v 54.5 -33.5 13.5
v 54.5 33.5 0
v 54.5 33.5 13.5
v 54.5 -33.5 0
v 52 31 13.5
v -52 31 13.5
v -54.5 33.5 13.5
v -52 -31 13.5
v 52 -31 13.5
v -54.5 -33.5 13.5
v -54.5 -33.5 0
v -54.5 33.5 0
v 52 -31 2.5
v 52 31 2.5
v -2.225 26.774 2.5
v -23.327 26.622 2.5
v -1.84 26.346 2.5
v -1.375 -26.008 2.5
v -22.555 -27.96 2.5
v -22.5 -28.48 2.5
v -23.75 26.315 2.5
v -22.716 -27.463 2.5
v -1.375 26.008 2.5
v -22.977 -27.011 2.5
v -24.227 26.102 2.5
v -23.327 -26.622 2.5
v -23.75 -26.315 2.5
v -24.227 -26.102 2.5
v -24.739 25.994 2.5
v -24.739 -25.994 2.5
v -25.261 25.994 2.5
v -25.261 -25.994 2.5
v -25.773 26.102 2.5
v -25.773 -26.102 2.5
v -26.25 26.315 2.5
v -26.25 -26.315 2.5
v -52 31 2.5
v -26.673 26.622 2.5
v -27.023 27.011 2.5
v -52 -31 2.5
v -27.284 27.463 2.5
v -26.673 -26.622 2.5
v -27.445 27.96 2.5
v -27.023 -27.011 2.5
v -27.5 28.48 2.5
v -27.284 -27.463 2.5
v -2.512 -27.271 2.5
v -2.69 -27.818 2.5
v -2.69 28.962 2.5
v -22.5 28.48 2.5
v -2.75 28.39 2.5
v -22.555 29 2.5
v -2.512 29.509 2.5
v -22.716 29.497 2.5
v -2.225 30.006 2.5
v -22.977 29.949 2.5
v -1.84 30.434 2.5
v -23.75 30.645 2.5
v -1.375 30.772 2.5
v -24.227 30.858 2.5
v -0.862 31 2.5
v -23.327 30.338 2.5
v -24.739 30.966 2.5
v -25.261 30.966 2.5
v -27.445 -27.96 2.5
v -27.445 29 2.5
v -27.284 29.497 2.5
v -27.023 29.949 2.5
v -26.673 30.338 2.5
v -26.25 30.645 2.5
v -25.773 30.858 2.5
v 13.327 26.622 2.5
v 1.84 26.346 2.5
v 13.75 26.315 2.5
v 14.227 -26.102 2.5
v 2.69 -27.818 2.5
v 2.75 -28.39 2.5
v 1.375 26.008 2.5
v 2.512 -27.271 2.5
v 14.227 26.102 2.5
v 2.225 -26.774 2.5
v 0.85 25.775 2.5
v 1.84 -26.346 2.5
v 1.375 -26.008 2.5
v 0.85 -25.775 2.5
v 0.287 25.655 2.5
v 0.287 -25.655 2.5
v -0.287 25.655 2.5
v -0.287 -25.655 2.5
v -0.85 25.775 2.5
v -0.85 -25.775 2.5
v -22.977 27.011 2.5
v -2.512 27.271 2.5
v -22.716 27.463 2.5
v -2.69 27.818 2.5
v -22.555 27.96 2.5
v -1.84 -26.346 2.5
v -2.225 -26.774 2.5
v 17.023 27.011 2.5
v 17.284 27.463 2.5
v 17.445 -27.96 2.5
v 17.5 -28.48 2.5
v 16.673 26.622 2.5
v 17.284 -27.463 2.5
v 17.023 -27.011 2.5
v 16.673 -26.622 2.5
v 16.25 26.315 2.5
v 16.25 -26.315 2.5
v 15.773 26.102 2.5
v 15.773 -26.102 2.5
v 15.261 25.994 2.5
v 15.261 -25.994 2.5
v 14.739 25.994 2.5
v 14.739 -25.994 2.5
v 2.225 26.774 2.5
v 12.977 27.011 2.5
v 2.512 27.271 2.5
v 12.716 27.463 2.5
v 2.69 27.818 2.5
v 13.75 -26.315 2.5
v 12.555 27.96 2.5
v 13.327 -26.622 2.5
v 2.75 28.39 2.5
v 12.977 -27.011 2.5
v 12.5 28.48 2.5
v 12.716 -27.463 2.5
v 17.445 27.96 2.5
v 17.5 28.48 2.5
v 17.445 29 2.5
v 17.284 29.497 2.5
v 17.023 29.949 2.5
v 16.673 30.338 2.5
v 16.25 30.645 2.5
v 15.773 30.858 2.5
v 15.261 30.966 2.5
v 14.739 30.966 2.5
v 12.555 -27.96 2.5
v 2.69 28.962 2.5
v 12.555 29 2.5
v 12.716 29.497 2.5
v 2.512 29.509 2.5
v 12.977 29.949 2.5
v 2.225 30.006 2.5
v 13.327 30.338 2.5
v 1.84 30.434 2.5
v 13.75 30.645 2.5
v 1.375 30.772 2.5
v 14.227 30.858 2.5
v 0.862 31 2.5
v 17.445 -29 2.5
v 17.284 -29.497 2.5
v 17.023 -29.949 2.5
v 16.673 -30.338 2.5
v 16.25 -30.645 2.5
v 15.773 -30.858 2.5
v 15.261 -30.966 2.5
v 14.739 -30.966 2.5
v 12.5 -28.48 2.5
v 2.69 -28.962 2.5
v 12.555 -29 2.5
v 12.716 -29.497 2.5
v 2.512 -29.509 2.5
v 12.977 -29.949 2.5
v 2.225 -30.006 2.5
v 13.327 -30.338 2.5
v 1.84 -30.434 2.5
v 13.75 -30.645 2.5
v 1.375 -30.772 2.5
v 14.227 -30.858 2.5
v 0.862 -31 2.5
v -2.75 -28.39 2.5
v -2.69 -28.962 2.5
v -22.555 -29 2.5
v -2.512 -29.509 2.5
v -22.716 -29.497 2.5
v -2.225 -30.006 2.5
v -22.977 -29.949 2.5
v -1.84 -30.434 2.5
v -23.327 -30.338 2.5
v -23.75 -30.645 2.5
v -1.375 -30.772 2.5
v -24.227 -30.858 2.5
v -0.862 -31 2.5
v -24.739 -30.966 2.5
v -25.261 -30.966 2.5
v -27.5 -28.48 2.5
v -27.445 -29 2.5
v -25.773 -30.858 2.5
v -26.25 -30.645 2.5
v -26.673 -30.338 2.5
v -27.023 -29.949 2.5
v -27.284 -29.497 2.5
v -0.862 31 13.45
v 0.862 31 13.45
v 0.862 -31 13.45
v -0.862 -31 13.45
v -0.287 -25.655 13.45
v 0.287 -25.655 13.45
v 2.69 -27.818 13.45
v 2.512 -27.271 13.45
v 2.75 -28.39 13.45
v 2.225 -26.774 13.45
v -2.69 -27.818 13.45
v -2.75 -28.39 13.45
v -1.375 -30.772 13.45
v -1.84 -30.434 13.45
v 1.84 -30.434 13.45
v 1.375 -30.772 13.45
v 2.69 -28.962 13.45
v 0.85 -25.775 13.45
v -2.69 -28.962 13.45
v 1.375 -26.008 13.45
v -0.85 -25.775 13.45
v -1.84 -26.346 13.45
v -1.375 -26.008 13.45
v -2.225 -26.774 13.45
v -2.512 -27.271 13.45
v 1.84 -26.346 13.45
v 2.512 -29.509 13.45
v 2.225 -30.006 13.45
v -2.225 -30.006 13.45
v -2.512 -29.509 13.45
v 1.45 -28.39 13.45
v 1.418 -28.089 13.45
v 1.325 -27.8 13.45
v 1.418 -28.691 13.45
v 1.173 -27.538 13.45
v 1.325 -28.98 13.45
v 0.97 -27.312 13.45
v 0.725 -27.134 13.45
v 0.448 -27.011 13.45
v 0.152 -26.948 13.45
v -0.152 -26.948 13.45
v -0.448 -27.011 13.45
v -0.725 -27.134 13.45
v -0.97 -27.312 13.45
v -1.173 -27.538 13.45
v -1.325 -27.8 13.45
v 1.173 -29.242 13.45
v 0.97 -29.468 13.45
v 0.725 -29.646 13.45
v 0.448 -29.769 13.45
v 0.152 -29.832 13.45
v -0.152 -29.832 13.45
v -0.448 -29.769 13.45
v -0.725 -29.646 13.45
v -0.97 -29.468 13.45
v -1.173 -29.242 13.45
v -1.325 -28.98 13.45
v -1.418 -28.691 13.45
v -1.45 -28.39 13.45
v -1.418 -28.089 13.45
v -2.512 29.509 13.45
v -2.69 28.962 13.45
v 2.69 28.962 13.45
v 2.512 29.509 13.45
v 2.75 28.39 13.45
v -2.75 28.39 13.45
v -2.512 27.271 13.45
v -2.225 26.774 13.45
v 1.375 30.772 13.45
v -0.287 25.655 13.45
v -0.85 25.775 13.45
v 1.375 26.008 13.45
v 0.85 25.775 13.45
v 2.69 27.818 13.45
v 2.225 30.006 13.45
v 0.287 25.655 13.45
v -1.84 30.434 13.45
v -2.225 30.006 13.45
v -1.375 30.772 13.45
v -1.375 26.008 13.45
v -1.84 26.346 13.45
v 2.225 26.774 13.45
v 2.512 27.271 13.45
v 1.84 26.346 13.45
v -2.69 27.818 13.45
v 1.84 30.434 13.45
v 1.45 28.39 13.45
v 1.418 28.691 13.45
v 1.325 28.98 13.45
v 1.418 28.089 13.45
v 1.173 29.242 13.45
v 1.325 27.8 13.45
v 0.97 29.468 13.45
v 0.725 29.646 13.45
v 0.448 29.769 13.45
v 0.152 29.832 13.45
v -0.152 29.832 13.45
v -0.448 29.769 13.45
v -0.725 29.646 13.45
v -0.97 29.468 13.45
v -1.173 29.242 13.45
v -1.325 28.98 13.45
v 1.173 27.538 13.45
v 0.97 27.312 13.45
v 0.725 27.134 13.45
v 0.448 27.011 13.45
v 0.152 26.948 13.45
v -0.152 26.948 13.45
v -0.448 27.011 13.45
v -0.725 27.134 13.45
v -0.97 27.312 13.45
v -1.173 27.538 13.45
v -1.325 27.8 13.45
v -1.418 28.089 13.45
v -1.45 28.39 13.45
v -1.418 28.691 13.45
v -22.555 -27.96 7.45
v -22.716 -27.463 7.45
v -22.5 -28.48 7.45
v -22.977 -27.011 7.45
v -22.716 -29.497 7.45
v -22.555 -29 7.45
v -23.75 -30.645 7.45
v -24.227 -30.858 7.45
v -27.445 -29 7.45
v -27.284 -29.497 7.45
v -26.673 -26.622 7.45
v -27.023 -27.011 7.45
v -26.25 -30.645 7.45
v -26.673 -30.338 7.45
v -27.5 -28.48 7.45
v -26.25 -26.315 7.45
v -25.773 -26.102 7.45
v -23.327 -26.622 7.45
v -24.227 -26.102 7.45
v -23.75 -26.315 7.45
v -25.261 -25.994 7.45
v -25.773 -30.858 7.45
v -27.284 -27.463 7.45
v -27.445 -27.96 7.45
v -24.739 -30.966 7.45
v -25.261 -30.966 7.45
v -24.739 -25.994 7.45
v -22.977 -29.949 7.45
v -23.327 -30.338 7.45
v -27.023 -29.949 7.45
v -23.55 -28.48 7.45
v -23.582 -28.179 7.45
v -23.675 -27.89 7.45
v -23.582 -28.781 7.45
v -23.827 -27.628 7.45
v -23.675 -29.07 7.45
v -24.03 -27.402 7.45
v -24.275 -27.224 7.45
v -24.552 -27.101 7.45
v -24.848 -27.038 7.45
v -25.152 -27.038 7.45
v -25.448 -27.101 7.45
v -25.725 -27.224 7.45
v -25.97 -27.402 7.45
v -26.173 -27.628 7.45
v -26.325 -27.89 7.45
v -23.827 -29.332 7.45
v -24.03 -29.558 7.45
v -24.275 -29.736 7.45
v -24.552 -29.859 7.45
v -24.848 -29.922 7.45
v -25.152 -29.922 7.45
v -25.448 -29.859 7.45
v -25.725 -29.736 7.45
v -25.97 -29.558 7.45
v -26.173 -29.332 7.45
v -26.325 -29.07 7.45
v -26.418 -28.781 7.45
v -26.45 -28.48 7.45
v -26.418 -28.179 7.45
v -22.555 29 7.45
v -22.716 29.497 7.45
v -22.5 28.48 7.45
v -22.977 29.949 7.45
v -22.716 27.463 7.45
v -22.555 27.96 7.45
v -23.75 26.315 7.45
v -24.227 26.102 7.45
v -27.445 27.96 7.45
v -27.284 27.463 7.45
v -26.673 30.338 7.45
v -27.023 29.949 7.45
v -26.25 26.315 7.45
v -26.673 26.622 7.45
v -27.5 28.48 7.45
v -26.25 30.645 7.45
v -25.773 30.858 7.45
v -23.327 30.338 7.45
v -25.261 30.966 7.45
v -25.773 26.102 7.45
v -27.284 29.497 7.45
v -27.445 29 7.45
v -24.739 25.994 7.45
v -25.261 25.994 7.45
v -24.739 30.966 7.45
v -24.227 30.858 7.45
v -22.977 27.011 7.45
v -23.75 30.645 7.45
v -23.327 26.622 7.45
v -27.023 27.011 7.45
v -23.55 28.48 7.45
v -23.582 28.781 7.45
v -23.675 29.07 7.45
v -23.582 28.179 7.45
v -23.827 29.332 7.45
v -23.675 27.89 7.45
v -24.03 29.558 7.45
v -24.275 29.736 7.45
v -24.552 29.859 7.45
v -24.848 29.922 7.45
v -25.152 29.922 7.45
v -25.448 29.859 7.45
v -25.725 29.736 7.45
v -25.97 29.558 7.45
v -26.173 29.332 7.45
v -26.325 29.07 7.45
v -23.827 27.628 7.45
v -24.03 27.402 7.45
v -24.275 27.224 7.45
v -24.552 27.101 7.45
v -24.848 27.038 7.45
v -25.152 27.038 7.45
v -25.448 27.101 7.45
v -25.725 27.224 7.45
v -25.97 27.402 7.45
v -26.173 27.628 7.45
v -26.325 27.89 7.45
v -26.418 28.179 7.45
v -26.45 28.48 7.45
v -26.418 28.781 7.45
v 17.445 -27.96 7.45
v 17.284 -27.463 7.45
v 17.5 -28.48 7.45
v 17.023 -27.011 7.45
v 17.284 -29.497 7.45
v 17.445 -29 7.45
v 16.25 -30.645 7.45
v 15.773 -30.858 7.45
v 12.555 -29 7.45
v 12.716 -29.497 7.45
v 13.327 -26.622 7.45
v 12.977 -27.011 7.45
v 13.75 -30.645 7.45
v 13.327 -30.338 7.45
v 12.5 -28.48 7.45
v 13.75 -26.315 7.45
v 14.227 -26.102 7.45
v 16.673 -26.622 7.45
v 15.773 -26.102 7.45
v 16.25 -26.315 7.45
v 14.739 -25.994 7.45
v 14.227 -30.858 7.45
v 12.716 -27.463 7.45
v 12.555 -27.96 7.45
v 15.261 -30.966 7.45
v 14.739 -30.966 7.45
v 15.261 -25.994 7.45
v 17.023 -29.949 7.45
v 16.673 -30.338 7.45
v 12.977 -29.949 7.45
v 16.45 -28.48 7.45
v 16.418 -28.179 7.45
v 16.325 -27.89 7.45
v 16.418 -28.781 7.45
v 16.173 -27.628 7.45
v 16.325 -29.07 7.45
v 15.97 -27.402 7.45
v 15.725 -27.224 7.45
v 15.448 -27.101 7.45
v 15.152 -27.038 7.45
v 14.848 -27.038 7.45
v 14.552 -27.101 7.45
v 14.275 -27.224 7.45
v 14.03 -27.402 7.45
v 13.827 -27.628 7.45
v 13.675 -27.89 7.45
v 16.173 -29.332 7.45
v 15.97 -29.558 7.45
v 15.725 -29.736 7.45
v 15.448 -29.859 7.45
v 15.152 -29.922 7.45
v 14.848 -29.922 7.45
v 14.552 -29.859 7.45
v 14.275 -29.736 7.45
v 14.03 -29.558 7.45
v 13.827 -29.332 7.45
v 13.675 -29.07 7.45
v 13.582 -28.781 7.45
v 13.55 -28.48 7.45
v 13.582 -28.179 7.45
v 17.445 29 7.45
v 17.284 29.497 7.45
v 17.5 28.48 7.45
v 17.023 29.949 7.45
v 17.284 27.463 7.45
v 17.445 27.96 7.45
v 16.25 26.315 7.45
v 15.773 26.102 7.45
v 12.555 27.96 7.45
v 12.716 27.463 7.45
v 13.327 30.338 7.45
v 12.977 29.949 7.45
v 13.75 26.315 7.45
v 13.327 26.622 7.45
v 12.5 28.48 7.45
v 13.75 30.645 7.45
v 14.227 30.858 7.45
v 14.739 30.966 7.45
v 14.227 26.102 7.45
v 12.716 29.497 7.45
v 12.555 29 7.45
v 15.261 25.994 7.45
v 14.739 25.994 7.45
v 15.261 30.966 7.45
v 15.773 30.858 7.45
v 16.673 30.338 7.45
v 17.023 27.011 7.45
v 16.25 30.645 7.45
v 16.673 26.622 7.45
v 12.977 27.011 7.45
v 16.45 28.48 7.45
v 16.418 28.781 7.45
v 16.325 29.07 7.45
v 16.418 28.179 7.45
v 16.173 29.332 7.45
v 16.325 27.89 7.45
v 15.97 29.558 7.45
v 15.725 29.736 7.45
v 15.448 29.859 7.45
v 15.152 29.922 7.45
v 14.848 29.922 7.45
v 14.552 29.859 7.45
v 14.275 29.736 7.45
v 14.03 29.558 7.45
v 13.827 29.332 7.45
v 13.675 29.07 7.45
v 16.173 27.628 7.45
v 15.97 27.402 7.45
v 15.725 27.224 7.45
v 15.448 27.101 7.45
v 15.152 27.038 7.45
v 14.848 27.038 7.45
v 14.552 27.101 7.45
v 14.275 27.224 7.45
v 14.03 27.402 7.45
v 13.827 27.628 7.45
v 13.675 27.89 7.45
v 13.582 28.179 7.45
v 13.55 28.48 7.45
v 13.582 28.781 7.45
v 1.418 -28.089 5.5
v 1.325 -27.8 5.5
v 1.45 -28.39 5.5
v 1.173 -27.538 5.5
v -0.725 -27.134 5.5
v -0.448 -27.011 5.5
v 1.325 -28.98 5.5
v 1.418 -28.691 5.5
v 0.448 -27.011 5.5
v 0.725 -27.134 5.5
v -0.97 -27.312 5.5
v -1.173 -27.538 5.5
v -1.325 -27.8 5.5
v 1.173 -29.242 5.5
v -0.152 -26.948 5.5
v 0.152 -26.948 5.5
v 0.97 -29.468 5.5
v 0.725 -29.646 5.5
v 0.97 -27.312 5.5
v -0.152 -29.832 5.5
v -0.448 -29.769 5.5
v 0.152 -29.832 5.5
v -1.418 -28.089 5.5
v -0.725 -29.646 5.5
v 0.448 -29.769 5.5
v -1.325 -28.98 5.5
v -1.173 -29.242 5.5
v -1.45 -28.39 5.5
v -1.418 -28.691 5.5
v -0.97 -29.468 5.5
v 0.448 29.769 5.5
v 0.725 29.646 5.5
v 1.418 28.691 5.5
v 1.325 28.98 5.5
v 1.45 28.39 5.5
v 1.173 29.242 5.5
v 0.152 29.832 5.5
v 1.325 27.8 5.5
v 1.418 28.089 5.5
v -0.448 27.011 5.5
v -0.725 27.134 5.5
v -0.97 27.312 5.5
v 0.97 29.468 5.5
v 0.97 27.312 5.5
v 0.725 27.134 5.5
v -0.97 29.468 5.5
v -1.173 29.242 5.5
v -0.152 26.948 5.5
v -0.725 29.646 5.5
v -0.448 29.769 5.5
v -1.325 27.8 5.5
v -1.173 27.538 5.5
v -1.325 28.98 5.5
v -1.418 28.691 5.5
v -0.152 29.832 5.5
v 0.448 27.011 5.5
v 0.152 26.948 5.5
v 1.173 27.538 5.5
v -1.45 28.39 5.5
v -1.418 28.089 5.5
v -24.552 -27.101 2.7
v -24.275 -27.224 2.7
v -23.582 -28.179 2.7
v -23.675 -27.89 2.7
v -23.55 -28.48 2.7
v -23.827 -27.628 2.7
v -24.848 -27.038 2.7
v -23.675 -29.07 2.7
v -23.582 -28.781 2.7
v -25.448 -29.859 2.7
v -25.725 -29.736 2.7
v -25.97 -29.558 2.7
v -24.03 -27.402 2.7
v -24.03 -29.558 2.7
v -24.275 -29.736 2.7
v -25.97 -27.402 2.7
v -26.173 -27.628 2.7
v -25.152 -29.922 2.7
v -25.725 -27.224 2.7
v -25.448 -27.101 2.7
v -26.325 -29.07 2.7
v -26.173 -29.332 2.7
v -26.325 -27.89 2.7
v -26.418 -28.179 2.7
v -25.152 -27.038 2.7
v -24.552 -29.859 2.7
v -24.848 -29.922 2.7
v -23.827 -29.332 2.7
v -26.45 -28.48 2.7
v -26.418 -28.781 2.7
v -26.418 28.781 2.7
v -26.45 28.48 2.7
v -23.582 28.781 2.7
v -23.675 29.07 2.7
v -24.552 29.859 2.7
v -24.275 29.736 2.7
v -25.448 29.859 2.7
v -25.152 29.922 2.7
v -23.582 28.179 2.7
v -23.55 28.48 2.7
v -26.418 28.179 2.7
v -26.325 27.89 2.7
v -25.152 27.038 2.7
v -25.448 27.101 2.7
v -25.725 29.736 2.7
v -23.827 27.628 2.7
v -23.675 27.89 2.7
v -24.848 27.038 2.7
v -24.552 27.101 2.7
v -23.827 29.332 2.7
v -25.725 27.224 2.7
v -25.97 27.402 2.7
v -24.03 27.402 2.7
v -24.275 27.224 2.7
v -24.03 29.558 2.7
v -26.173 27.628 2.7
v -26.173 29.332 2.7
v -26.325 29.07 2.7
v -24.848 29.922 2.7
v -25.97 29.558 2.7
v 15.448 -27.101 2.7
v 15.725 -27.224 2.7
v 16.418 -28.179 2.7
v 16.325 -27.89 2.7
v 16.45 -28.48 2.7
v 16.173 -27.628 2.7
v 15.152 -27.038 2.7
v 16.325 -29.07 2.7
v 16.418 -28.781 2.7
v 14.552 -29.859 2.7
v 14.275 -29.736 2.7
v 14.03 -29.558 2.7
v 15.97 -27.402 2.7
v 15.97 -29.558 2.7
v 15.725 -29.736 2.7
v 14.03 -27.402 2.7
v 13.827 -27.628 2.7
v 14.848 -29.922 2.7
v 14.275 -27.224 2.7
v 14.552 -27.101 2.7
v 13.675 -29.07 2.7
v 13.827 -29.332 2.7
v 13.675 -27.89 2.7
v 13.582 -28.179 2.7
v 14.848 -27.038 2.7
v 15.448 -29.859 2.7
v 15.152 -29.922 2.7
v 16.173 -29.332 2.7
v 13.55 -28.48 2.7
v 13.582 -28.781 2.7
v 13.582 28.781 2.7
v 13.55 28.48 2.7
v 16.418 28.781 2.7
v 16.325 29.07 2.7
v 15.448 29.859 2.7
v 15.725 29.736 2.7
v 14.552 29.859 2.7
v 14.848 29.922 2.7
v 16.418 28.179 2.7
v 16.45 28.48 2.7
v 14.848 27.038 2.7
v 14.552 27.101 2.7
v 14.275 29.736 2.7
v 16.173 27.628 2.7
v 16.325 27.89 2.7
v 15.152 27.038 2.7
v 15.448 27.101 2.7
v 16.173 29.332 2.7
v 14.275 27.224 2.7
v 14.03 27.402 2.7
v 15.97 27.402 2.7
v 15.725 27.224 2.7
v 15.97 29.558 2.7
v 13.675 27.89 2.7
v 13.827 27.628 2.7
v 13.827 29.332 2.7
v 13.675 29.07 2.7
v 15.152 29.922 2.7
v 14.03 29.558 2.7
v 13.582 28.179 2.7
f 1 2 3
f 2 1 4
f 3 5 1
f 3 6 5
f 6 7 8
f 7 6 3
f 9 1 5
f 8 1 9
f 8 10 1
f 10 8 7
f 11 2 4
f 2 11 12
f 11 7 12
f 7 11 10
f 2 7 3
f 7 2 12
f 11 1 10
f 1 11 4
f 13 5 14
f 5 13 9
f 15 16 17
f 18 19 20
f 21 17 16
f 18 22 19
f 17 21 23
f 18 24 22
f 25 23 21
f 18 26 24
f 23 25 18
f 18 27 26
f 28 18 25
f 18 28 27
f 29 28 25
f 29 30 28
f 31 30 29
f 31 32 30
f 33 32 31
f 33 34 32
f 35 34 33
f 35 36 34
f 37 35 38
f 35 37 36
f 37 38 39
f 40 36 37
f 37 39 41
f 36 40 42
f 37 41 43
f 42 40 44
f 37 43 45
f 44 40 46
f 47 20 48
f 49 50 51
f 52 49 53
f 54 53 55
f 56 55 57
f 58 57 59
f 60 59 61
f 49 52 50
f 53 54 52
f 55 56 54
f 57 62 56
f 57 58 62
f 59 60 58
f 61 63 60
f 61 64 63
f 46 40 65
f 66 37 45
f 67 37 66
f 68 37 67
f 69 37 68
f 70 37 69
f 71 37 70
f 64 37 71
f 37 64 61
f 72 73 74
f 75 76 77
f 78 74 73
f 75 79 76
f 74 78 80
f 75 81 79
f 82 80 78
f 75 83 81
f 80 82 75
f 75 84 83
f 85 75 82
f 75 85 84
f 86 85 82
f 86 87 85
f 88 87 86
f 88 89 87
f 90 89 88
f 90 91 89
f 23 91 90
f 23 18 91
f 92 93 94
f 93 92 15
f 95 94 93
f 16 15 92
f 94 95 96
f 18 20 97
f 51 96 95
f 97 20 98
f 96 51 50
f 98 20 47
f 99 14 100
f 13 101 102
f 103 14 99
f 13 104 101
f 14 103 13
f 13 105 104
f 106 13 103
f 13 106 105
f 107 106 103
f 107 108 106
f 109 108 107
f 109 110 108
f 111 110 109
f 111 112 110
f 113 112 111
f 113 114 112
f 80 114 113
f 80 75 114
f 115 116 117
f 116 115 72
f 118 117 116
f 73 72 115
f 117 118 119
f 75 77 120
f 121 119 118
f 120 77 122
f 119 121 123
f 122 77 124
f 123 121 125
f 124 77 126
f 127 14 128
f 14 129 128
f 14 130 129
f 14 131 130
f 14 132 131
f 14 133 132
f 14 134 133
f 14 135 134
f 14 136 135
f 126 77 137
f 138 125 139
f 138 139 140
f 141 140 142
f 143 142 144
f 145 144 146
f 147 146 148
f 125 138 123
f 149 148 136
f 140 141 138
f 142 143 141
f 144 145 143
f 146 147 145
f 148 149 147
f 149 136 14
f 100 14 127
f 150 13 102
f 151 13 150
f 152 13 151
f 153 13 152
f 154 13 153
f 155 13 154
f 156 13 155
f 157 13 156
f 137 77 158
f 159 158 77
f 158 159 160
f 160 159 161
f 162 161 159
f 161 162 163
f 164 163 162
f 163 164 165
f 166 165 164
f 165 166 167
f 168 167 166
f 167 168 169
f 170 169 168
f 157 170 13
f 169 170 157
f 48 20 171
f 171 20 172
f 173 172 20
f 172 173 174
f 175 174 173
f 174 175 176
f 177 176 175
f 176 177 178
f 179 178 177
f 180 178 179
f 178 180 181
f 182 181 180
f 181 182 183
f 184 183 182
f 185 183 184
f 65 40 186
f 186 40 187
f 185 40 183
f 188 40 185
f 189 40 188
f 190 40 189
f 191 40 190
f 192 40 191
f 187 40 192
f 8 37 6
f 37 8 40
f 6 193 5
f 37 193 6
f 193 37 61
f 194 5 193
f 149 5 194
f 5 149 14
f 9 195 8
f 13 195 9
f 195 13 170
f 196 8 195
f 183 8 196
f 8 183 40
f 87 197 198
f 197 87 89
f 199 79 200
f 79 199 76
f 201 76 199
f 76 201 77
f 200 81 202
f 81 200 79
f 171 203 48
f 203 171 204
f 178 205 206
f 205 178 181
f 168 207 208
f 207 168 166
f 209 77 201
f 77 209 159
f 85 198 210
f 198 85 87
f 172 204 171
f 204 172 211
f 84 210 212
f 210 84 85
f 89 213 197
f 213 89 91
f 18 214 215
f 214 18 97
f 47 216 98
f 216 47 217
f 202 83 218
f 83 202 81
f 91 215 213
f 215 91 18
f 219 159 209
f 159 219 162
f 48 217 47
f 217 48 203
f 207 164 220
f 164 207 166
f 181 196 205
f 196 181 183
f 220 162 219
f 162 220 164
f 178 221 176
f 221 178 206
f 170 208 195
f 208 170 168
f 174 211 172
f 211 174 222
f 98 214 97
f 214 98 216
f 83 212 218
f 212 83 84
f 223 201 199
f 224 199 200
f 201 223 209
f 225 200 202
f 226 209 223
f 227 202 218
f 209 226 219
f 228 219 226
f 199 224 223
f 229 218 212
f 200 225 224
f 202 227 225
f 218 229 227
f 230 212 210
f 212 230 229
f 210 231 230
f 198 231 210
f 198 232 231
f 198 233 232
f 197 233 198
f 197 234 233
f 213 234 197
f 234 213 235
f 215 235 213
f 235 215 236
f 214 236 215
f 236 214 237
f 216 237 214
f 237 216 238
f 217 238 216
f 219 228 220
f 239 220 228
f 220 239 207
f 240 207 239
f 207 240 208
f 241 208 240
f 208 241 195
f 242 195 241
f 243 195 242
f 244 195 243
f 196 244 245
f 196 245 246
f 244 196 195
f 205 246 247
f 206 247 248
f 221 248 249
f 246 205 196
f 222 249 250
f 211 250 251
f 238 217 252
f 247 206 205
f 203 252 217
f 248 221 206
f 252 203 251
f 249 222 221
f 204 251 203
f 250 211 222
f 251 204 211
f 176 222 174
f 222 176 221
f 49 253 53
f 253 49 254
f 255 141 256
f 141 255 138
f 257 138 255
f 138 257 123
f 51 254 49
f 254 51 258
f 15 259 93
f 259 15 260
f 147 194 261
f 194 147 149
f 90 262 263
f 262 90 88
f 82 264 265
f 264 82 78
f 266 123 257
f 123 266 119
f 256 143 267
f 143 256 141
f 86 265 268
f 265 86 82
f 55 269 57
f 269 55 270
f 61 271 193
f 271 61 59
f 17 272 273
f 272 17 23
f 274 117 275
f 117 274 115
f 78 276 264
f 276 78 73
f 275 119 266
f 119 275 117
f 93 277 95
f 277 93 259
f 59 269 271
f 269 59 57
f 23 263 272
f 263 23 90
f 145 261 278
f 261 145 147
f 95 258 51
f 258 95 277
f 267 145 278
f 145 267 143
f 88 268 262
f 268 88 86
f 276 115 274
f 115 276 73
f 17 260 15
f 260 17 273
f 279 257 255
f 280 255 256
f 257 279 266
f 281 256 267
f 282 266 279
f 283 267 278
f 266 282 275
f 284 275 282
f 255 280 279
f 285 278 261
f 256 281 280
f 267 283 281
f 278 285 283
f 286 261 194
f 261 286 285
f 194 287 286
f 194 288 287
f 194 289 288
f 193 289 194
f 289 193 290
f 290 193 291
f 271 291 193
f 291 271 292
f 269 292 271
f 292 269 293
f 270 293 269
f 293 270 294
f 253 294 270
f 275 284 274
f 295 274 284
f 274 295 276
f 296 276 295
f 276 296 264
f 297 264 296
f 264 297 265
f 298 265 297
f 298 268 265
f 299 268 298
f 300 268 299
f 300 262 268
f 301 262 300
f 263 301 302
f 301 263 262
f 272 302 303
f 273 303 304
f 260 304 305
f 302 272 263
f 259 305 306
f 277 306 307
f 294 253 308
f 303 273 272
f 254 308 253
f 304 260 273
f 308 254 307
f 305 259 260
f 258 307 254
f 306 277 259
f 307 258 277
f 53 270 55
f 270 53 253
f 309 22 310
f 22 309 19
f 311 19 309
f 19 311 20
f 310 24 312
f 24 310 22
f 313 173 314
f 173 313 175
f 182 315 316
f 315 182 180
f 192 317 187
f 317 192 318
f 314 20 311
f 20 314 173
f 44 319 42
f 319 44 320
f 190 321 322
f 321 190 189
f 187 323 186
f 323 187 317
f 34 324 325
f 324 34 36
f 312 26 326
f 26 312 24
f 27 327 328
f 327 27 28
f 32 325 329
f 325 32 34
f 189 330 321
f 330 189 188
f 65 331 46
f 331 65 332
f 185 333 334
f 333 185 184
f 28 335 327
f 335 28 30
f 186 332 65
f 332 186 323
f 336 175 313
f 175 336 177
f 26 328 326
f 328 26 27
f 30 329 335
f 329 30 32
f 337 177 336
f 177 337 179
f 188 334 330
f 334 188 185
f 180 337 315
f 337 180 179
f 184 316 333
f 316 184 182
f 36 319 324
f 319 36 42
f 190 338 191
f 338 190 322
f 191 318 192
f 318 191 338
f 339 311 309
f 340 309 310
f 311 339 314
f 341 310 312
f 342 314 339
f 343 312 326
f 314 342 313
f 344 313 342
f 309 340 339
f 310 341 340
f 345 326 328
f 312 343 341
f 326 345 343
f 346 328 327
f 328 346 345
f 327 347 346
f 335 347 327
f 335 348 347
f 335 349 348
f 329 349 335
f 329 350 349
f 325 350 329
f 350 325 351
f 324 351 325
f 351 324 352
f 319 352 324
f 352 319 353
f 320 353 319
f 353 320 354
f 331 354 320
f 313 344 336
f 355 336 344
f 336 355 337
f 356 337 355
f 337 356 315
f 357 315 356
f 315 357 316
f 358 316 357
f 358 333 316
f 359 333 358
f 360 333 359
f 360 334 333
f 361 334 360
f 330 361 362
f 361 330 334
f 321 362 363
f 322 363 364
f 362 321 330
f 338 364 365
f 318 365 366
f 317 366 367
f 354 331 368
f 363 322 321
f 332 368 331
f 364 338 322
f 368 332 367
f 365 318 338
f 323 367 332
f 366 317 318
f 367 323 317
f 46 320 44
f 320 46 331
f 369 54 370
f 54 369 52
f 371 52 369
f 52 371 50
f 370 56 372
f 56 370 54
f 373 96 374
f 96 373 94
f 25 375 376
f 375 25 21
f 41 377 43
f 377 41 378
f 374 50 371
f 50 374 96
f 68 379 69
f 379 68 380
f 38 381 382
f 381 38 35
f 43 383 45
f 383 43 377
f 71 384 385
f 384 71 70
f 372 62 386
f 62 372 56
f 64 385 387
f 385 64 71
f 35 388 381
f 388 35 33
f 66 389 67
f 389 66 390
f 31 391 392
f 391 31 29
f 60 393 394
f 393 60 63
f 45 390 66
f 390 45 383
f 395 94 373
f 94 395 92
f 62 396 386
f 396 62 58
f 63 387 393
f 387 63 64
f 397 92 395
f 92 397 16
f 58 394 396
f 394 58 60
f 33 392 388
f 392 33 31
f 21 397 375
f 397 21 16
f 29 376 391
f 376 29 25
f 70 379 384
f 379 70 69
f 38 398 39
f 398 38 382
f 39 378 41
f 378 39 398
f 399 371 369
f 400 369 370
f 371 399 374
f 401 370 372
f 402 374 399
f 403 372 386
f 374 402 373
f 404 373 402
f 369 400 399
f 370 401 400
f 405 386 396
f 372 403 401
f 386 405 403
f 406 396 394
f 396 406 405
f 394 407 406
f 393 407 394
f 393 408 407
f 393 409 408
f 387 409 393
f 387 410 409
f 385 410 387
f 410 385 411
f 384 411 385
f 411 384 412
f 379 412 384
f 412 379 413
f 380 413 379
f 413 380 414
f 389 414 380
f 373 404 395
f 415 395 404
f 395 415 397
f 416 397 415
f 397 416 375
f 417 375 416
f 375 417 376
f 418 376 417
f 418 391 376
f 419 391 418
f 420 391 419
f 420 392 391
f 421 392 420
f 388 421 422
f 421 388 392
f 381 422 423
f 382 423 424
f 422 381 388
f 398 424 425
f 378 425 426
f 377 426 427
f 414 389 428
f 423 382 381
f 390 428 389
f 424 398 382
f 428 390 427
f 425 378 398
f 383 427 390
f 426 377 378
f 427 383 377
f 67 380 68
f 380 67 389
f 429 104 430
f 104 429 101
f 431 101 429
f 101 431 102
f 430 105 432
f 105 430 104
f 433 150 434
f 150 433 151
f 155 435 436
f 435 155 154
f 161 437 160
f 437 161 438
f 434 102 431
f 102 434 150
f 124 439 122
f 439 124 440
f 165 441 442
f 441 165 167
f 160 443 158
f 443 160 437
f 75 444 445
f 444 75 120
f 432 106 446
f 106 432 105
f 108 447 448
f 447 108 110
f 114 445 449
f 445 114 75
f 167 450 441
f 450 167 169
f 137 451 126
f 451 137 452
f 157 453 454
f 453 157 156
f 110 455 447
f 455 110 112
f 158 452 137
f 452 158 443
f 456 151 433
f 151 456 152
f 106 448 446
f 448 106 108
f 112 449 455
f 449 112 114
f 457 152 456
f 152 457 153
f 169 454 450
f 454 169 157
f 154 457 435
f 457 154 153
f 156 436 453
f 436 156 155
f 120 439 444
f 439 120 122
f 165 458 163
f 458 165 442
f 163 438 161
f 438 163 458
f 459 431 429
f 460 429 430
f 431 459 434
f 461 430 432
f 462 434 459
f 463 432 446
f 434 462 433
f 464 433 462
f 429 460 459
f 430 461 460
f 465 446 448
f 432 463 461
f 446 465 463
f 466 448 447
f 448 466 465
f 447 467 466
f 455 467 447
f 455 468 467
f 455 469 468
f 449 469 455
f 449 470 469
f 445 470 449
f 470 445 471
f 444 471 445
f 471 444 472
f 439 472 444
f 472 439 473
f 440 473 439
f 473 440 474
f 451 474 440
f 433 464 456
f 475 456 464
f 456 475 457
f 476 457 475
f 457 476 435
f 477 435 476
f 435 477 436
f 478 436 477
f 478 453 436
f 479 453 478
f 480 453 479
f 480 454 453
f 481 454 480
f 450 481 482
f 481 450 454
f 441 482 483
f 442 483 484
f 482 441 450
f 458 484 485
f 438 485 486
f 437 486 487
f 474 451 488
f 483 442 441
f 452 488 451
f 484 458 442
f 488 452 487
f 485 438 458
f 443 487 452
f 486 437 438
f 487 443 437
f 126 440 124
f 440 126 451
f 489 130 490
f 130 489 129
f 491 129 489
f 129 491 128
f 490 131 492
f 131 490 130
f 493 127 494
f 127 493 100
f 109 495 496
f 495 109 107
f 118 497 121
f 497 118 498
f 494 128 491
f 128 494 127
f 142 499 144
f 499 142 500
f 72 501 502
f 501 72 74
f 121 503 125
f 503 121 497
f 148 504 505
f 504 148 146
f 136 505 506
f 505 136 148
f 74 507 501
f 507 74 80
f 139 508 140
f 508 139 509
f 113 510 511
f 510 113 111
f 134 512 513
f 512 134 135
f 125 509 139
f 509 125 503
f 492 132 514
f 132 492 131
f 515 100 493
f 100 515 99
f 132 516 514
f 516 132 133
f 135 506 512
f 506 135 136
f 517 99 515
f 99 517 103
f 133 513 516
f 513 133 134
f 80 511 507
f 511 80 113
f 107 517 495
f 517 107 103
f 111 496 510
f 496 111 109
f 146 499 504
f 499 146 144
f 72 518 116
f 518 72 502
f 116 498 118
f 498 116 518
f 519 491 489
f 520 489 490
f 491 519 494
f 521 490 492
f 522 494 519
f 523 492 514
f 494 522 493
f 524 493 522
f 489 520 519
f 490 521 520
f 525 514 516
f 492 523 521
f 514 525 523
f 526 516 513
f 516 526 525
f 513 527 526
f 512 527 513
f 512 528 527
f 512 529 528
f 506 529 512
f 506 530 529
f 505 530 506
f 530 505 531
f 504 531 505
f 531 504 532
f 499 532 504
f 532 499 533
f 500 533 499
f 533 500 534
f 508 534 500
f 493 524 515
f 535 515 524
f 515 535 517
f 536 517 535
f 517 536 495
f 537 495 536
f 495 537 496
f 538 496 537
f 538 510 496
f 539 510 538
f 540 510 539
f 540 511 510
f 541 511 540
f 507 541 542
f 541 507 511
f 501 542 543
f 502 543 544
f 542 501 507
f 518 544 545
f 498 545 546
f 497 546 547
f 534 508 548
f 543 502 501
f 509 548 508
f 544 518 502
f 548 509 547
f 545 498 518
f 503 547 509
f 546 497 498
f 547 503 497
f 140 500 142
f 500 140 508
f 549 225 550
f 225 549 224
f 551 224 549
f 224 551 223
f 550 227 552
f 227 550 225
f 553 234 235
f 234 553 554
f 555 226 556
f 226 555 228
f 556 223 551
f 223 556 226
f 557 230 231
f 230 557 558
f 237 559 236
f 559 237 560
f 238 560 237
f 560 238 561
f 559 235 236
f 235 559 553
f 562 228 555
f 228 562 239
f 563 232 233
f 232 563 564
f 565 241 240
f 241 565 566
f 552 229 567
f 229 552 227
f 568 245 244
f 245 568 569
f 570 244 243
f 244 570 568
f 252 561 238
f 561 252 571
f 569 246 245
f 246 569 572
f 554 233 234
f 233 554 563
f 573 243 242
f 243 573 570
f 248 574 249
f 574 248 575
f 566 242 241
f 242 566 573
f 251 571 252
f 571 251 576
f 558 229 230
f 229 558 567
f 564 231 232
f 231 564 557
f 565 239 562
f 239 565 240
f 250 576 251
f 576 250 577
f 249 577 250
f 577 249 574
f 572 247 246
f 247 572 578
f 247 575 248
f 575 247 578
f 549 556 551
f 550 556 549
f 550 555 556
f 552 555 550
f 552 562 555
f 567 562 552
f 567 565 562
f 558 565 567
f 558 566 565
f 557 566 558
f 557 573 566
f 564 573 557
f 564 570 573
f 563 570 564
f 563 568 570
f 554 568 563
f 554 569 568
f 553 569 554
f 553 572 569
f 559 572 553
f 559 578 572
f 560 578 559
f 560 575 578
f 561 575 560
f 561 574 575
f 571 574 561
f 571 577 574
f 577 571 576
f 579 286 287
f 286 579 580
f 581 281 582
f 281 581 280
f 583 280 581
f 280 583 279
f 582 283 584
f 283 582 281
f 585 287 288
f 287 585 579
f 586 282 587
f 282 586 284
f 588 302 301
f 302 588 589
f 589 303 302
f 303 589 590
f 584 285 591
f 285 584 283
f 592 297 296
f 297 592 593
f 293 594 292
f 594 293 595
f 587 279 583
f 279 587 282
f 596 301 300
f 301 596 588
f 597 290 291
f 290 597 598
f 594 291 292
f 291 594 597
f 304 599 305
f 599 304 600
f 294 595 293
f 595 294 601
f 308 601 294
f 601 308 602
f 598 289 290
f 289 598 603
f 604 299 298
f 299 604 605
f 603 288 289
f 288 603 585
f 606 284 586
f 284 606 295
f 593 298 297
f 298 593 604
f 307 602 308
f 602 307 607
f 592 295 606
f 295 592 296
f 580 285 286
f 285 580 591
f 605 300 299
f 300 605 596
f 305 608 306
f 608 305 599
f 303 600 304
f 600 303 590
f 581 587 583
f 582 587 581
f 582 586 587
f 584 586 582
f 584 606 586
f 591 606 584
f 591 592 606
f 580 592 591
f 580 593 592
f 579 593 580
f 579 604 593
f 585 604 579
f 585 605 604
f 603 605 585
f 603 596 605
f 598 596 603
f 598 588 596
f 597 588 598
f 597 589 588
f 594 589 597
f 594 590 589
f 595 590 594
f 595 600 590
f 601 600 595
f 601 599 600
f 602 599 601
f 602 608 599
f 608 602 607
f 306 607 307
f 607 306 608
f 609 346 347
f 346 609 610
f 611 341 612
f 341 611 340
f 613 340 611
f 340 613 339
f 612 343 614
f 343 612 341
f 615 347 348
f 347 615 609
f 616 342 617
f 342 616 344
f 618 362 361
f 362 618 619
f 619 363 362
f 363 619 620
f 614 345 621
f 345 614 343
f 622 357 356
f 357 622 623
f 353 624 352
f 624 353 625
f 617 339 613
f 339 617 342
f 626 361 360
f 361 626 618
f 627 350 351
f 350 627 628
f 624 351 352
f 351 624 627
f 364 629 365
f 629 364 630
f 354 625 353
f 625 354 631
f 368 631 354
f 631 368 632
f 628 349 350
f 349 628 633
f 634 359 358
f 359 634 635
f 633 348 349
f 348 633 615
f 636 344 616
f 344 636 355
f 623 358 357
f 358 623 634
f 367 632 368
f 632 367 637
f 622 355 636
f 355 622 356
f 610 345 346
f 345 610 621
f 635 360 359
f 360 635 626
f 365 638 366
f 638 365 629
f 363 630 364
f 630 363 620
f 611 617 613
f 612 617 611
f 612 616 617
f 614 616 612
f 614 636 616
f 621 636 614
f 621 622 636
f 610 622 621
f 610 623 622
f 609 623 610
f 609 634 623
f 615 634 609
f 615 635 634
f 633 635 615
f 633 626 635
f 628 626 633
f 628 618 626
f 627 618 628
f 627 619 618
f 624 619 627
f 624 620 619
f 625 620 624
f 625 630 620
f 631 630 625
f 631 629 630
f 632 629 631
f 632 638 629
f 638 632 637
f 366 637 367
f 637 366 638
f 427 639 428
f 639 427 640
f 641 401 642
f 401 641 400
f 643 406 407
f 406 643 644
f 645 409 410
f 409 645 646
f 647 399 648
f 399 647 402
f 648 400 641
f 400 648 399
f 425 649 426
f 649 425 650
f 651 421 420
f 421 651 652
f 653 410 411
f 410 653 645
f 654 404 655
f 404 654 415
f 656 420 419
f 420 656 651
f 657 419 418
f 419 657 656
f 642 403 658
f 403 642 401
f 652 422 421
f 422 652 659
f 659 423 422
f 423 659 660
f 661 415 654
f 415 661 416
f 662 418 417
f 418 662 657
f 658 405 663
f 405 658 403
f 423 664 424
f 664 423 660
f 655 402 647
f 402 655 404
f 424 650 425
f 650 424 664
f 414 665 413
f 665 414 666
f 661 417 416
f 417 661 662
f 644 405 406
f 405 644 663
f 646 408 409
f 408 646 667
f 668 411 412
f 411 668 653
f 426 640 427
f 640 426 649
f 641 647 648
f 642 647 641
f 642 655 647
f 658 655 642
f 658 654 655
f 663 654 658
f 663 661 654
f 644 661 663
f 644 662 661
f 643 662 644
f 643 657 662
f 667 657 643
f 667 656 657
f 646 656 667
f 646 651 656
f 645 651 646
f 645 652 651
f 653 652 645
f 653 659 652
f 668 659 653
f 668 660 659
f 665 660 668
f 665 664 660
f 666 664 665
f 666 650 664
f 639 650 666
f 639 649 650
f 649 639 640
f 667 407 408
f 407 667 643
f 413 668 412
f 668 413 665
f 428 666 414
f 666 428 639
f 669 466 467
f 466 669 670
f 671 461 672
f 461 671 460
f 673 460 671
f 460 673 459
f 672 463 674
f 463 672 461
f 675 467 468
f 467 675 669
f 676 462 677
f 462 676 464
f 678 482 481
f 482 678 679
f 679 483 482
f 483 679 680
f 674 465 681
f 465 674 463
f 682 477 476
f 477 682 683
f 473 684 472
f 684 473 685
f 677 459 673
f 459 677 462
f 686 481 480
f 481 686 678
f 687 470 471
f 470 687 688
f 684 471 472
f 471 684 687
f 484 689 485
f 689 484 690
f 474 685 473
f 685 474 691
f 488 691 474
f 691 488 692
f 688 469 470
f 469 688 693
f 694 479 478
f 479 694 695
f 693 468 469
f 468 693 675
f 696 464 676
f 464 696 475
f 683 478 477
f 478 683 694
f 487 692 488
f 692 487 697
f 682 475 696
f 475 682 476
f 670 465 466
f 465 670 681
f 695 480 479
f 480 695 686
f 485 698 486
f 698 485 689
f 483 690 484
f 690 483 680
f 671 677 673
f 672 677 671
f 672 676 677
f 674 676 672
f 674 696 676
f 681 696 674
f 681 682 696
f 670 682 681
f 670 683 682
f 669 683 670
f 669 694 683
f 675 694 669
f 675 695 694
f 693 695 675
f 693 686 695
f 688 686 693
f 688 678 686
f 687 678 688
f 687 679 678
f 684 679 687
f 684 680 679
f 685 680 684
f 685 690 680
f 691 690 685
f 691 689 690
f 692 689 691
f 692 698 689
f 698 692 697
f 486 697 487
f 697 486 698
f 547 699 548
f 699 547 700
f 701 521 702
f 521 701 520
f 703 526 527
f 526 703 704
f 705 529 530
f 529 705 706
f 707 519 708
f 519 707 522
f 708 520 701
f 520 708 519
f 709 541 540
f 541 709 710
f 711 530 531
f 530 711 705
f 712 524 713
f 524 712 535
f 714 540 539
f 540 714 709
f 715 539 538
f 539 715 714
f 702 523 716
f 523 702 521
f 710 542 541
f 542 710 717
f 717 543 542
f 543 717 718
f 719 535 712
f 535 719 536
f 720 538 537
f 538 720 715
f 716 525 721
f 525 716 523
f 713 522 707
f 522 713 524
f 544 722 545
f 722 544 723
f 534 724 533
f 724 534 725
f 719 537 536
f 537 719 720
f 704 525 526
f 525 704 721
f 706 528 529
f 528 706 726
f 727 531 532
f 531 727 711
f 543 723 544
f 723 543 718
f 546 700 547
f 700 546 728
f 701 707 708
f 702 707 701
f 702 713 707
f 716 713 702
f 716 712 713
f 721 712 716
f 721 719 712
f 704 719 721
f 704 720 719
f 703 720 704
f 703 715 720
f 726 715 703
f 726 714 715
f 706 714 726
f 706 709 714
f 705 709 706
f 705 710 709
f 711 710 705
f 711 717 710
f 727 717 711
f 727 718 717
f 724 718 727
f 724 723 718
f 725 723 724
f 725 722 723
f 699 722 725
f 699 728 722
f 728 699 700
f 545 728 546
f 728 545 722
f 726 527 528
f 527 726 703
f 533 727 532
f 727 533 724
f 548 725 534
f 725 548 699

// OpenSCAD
//*************************************
// Description:
// 
// A two part box consisting of a lower and upper shell
// with mounting bosses for PCB
// 
// Designed for Lyre project
// 
//
// Fabrication:
//
// print lower part (box_lower = true)
// print upper part (box_lower = false)
//
// Copyright CC-BY-SA Bob Cousins 2010
//
// Rev 1, initial version
// Rev 2, put bosses in correct places for Lyre V1 PCB
//        exploded_view mode -  draw pcb, screws
//*************************************

// assume all units are mm


// A simple tray shape
module box_shell()
{
    difference() 
    {
        cube([outer_x, outer_y, outer_z],
            center = false);

        translate ([wall,wall,wall]) 
            cube([inner_x, inner_y, inner_z+wall], 
                center = false);
    }
}

// draw a mounting boss
// dimensions are relative to inner dimensions 
module boss (x, y, z, boss_h, boss_diam)
{
$fs=0.1;
    translate ([x+wall, y+wall, z])
    translate ([0, 0, boss_h/2 - fudge])
    cylinder (h = boss_h + fudge, r = boss_diam/2, center=true);
}

// vertical hole for screw in a boss
module screw_hole (x, y, boss_h, hole_depth, hole_diam)
{
$fs=0.1;
    translate ([x+wall, y+wall, 0])
    
    translate ([0, 0, boss_h+wall-hole_depth])
    cylinder (h = hole_depth+fudge, r = hole_diam/2);
}

// countersink for vertical hole in a boss 
// assume counter sink head is 2*diameter and height is diam/2
module countersink_hole (x, y, z, screw_depth, screw_diam)
{
$fs=0.5;
    translate ([x+wall, y+wall, z-fudge])
    
    cylinder (h = screw_diam/2 + fudge, r1 = screw_diam, r2 = screw_diam/2);
}

module csink_head (x, y, z, screw_depth, screw_diam)
{
$fs=0.5;
    translate ([x+wall, y+wall, z])
    cylinder (h = screw_diam/2 + fudge, r1 = screw_diam, r2 = screw_diam/2);
}

// vertical screw
module screw (x, y, z, screw_len, screw_diam, countersink)
{
$fs=0.1;
    translate ([x+wall, y+wall, z])
    cylinder (h = screw_len, r = screw_diam/2);
    if (countersink)
        csink_head (x,y,z, screw_len, screw_diam);
    else
    {
        translate ([x+wall, y+wall, z+screw_len])
        cylinder (h = screw_diam/2, r = screw_diam);
    }
    
}

module pcb (x,y,z, size_x, size_y, size_z)
{
    size = case_boss_diam + 1;

    translate ([0, 0, z])
    difference ()
    {
        translate ([x+wall, y+wall, 0])
           cube ([size_x, size_y, size_z]);

        // make a cutout for case bosses
        // allow space for clearance
        
        boss (case_boss_x, case_boss_y1, 0, pcb_h+fudge, size);
        translate ([case_boss_x+wall, case_boss_y1+wall-size/4, pcb_h/2])
        cube ([size, size/2, pcb_h+fudge*2], center=true);
        
        boss (case_boss_x, case_boss_y2, 0, pcb_h+fudge, size);
        translate ([case_boss_x+wall, case_boss_y2+wall+size/4, pcb_h/2])
        cube ([size, size/2, pcb_h+fudge*2], center=true);
        
        // draw PCB mounting holes
        boss (pcb_boss_x1, pcb_boss_y1, 0, pcb_h+fudge, screw_diam); 
        boss (pcb_boss_x1, pcb_boss_y2, 0, pcb_h+fudge, screw_diam);
        
        boss (pcb_boss_x2, pcb_boss_y1, 0, pcb_h+fudge, screw_diam); 
        boss (pcb_boss_x2, pcb_boss_y2, 0, pcb_h+fudge, screw_diam);
    }
}

// A lid with lipped edge
// option: solid_lid = 0 or 1
module box_lid ()
{
    // flip the lid over
    translate ([outer_x,0,wall+lip_z])
    rotate ([0,180,0])
    
    difference() {

        union() {
            translate ([0,0,lip_z])
            cube([outer_x, outer_y, wall], center = false);
    
            translate ([wall,wall,0])
            cube([inner_x, inner_y, lip_z+wall/2], center = false);
        }

        if (solid_lid == 0)
        {
            translate ([wall+lip_width, wall+lip_width, -wall/2])
                    cube([inner_x - lip_width*2, 
                  inner_y - lip_width*2, 
                  lip_z+wall/2], center = false);
        }
    }
}

// ****************************************************************************
// draw complete box half 
// option: box_lower = true or false
module box(box_lower)
{
    difference () 
    {
        // draw solid parts: case shell, bosses 
        union ()
        {
            box_shell();

            // draw through bosses for case 
            boss (case_boss_x, case_boss_y1, wall, inner_z, case_boss_diam);
            boss (case_boss_x, case_boss_y2, wall, inner_z, case_boss_diam);
            
            // draw blind bosses for PCB mount
            boss (pcb_boss_x1, pcb_boss_y1, wall, pcb_boss_h, pcb_boss_diam); 
            boss (pcb_boss_x1, pcb_boss_y2, wall, pcb_boss_h, pcb_boss_diam);
            
            boss (pcb_boss_x2, pcb_boss_y1, wall, pcb_boss_h, pcb_boss_diam); 
            boss (pcb_boss_x2, pcb_boss_y2, wall, pcb_boss_h, pcb_boss_diam);
        }

        // draw apertures: screw holes
        
        // holes for case bosses
        if (box_lower)
        {
            screw_hole       (case_boss_x, case_boss_y1, inner_z,  inner_z+wall*2, screw_diam);    
            countersink_hole (case_boss_x, case_boss_y1, 0,        inner_z+wall*2, screw_diam);
            
            screw_hole       (case_boss_x, case_boss_y2, inner_z, inner_z+wall*2, screw_diam);
            countersink_hole (case_boss_x, case_boss_y2, 0,       inner_z+wall*2, screw_diam);
        }
        else
        {
            screw_hole  (case_boss_x, case_boss_y1, inner_z, case_boss_hole_d, screw_diam);    
            screw_hole  (case_boss_x, case_boss_y2, inner_z, case_boss_hole_d, screw_diam);
        }
        
        // holes for PCB bosses
        screw_hole (pcb_boss_x1, pcb_boss_y1, pcb_boss_h, pcb_boss_hole_d, screw_diam); 
        screw_hole (pcb_boss_x1, pcb_boss_y2, pcb_boss_h, pcb_boss_hole_d, screw_diam);
        
        screw_hole (pcb_boss_x2, pcb_boss_y1, pcb_boss_h, pcb_boss_hole_d, screw_diam); 
        screw_hole (pcb_boss_x2, pcb_boss_y2, pcb_boss_h, pcb_boss_hole_d, screw_diam);
    }
}
//*************************************

// exploded view
module exploded_view ()
{
    screw  (case_boss_x, case_boss_y1, -screw_len2-5,      screw_len2, screw_diam-fudge, true);
    screw  (case_boss_x, case_boss_y2, -screw_len2-5,      screw_len2, screw_diam-fudge, true);
    
    box (true);
    
    y2 = outer_z + 10;
//    y2 = wall+pcb_boss_h;
    pcb (in_center_x - 52.07, in_center_y-30.48, y2, pcb_size_x, pcb_size_y, pcb_h);

    y3 = y2 + 2 + 10;
    screw  (pcb_boss_x1, pcb_boss_y1,  y3, screw_len1, screw_diam-fudge, false);    
    screw  (pcb_boss_x1, pcb_boss_y2,  y3, screw_len1, screw_diam-fudge, false);    
    screw  (pcb_boss_x2, pcb_boss_y1,  y3, screw_len1, screw_diam-fudge, false);    
    screw  (pcb_boss_x2, pcb_boss_y2,  y3, screw_len1, screw_diam-fudge, false);    

    y4 = y3 + screw_len1 + 10;
    translate ([0,0,y4 + outer_z])
    mirror ([0,0,1])
    box (false);    
}

//*************************************
// Constants
col_silver = [0.5,0.5,0.5];

//*************************************
// >>>>  Edit Parameters Here <<<<

// set true or false for lower or upper half
box_lower = false;
 
// assume uniform wall thickness
wall = 2.5;

// inner dimensions
inner_x = 104;
inner_y = 62;
inner_z = 11;

// for PCB mounting
pcb_boss_h    = 5;
pcb_boss_diam = 5;

// for case
case_boss_h    = inner_z;
case_boss_diam = 5.5;

// No.4 screws
screw_diam = 2.9;
screw_len1 = 6.4; // 1/4"
screw_len2 = 19;  // 3/4"

// For the Lyre v1 PCB, the boss positions are referenced from the inner center
in_center_x = inner_x /2;
in_center_y = inner_y /2;

pcb_boss_x1  = in_center_x - 25;
pcb_boss_x2  = in_center_x + 15;

pcb_boss_y1  = in_center_y - 28.48;
pcb_boss_y2  = in_center_y + 28.48;

case_boss_x  = in_center_x;
case_boss_y1 = in_center_y - 28.39;
case_boss_y2 = in_center_y + 28.39;

pcb_size_x = 77;
pcb_size_y = 61;
pcb_h      = 1.6;  // PCB thickness, typically 1.6mm
//********* End Parameters ***********************


//*************************************
// Calculated dimensions
outer_x = inner_x + wall*2;
outer_y = inner_y + wall*2;
outer_z = inner_z + wall;

center_x = outer_x / 2;
center_y = outer_y / 2;
center_z = 0;

screw_r = screw_diam / 2;

pcb_boss_r      = pcb_boss_diam/2;
pcb_boss_hole_d = screw_len1 - pcb_h;

case_boss_r      = case_boss_diam/2;
case_boss_hole_d = screw_len2 - inner_z;  
//*************************************

// a fudge factor to avoid non-manifold errors
fudge = 0.1;
exploded = false;
//*************************************


// centre at (0,0)
translate ([-center_x, -center_y, -center_z])
if (exploded)
    exploded_view();
else
    box(box_lower);


//*************************************
//end
